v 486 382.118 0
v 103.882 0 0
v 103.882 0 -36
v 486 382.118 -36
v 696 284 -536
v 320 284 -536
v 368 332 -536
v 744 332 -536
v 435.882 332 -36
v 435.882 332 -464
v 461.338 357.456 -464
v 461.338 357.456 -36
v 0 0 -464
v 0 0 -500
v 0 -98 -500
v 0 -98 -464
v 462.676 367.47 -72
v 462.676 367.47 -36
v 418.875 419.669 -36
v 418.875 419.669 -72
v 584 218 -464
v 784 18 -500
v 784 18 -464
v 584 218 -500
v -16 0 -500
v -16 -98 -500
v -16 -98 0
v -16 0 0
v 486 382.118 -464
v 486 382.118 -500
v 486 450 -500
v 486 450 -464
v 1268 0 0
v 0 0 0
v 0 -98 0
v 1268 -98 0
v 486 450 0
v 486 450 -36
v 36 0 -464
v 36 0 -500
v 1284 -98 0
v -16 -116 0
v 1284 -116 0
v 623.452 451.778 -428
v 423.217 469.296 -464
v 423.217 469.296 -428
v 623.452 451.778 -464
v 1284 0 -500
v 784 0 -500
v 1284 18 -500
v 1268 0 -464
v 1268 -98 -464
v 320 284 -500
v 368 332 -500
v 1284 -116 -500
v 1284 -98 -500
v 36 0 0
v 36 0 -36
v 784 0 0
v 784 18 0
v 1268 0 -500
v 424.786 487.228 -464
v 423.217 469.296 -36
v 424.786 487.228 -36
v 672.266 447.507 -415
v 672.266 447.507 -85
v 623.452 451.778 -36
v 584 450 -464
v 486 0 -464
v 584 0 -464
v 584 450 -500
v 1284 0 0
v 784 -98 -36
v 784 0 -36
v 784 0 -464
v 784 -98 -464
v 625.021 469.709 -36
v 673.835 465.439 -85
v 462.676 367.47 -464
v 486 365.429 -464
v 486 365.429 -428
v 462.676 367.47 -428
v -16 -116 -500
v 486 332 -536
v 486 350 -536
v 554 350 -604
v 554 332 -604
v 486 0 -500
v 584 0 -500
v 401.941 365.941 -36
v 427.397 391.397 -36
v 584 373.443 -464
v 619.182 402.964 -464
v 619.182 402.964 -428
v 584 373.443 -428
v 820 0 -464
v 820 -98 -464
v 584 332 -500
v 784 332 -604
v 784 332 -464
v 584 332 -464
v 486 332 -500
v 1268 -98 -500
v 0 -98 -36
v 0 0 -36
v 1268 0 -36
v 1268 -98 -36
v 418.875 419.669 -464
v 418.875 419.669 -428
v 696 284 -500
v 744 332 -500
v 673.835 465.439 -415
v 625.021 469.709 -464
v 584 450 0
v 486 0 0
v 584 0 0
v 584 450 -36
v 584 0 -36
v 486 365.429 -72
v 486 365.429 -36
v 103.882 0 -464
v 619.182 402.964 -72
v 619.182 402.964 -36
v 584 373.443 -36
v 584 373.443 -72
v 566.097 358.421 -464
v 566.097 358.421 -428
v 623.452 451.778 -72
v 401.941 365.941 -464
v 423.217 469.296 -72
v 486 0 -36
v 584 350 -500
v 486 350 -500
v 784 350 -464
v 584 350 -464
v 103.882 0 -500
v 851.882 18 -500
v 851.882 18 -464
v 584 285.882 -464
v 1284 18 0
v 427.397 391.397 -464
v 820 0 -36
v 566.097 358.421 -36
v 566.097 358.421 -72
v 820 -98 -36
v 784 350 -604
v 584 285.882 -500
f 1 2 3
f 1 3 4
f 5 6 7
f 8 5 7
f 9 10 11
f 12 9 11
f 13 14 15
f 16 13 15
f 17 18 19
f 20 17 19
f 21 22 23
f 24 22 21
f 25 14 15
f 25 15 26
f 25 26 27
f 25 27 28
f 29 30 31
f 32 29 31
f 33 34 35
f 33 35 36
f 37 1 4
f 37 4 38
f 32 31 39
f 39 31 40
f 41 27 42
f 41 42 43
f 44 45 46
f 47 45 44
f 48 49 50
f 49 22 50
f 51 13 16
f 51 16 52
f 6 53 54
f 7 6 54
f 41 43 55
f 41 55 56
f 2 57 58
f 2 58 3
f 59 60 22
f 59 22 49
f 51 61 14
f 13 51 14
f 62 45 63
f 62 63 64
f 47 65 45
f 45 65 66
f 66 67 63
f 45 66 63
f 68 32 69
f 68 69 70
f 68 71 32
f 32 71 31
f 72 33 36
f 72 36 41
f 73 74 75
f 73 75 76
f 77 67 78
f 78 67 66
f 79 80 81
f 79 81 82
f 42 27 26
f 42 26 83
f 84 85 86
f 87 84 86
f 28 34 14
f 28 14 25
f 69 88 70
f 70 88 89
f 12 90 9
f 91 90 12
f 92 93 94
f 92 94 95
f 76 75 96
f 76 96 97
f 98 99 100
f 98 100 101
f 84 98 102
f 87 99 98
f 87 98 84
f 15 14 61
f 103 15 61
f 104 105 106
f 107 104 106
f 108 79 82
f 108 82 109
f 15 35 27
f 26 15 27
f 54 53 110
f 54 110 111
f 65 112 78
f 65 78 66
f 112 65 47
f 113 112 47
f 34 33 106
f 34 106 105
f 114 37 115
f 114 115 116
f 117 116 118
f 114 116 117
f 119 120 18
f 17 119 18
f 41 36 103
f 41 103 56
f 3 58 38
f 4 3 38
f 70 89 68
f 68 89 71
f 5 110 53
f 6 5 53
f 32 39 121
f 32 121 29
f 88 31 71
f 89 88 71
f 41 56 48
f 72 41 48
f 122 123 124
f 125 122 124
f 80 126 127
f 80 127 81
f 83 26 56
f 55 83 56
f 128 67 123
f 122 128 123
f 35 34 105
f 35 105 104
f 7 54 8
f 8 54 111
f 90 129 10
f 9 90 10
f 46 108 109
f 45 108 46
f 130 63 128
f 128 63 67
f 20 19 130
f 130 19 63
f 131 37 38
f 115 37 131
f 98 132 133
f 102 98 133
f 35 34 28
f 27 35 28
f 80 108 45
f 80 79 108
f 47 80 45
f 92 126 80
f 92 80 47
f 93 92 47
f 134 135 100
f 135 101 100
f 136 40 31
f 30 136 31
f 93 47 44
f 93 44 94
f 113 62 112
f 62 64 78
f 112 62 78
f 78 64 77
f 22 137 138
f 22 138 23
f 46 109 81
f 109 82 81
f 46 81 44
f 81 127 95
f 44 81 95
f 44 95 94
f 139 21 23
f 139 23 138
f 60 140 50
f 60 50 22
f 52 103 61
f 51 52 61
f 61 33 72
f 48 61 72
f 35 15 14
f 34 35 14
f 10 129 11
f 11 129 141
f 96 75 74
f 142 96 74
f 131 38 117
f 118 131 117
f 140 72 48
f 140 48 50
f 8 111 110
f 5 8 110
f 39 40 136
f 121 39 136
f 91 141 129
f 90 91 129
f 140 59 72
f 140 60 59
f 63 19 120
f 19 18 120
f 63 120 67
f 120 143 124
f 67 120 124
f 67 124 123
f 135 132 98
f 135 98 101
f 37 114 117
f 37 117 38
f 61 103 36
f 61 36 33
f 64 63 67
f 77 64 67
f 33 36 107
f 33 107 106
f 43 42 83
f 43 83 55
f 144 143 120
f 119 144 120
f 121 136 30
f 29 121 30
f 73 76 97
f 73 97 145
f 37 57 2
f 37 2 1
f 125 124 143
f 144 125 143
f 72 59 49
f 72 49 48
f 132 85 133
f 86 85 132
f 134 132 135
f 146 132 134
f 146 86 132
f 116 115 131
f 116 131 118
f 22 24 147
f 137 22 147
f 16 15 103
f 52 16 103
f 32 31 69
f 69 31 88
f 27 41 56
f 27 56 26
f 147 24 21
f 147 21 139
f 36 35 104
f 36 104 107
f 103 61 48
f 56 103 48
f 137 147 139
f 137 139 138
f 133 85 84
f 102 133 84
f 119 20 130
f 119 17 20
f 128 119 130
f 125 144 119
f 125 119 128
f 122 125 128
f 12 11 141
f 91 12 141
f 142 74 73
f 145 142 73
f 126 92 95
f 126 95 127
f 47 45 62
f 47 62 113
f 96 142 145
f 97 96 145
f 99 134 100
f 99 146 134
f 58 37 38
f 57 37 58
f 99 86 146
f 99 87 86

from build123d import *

# Parameters (mm, degrees)
F1_DEPTH       = 500
F2_DEPTH       = 36
F3_DEPTH       = 36
F4_DEPTH       = 36
F5_DEPTH       = 500
F0_W           = 16
F0_H           = 98
F6_DEPTH       = 500
F8_DEPTH       = 36
F9_DEPTH       = 428
F14_W          = 98
F14_H          = 428
F15_DEPTH      = 36
F16_W          = 98
F16_H          = 48
F17_DEPTH      = 36
F16_H_2        = 18
F18_DEPTH      = 104
F18_DEPTH_BACK = 36
F19_W          = 98
F19_H          = 36
F20_DEPTH      = 18
F22_DEPTH      = 36
F24_DEPTH      = 428
F26_DEPTH      = 18


with BuildPart() as f1:
    # F0 (on Top) → F1 (new body)
    with BuildSketch(Plane.XY):
        Polygon((1268, -98), (0, -98), (-16, -98), (-16, -116), (1284, -116), (1284, -98), align=None)
    extrude(amount=-F1_DEPTH)


with BuildPart() as f2:
    # F0 (on Top) → F2 (new body)
    with BuildSketch(Plane.XY):
        Polygon((36, 0), (0, 0), (0, -98), (1268, -98), (1268, 0), (784, 0), (584, 0), (486, 0), (103.8822509939, 0), align=None)
    extrude(amount=-F2_DEPTH)


with BuildPart() as f3:
    # F0 (on Top) → F3 (new body)
    with BuildSketch(Plane.XY):
        Polygon((584, 450), (486, 450), (486, 382.1177490061), (486, 0), (584, 0), align=None)
    extrude(amount=-F3_DEPTH)


with BuildPart() as f4:
    # F0 (on Top) → F4 (new body)
    with BuildSketch(Plane.XY):
        Polygon((486, 450), (36, 0), (103.8822509939, 0), (486, 382.1177490061), align=None)
    extrude(amount=-F4_DEPTH)


with BuildPart() as f5:
    # F0 (on Top) → F5 (new body)
    with BuildSketch(Plane.XY):
        Polygon((784, 0), (1268, 0), (1284, 0), (1284, 18), (784, 18), align=None)
    extrude(amount=-F5_DEPTH)


with BuildPart() as f6:
    # F0 (on Top) → F6 (new body)
    with BuildSketch(Plane.XY):
        with Locations((1276, -49)):
            Rectangle(F0_W, F0_H)
    extrude(amount=-F6_DEPTH)


with BuildPart() as f8:
    # F7 (on face) → F8 (new body)
    with BuildSketch(Plane(origin=(0, 0, -36), x_dir=(1, 0, 0), z_dir=(0, 0, -1))):
        Polygon((418.8753596794, -419.6689985812), (423.2171666194, -469.2960789942), (623.4523009358, -451.7777747019), (619.1816695412, -402.9642344955), (584, -373.4433085592), (584, -450), (486, -450), (486, -365.4289487301), (462.6759038301, -367.469542732), align=None)
        Polygon((566.0974979401, -358.4213256836), (486, -365.4289487301), (486, -450), (584, -450), (584, -373.4433085592), align=None)
    extrude(amount=F8_DEPTH)


with BuildPart() as f9:
    # F7 (on face) → F9 (new body)
    with BuildSketch(Plane(origin=(0, 0, -36), x_dir=(1, 0, 0), z_dir=(0, 0, -1))):
        Polygon((423.2171666194, -469.2960789942), (424.7859699888, -487.2275835599), (673.8346445118, -465.438647873), (672.2658411423, -447.5071433073), (623.4523009358, -451.7777747019), align=None)
    extrude(amount=F9_DEPTH)

    # F25 (on face) → F26 (cut, through all)
    with BuildSketch(Plane(origin=(43.9610143142, 502.4766928934, 0), x_dir=(0.9961946981, -0.0871557427, 0), z_dir=(-0.0871557427, -0.9961946981, 0))):
        Polygon((630.7048491943, -36), (581.7048491943, -36), (630.7048491943, -85), align=None)
        Polygon((630.7048491943, -464), (630.7048491943, -415), (581.7048491943, -464), align=None)
    extrude(amount=-F26_DEPTH, mode=Mode.SUBTRACT)


with BuildPart() as f11_1:
    # F11: instance of F3
    add(f3.part.mirror(Plane(origin=(317, -53.5, -250), x_dir=(1, 0, 0), z_dir=(0, 0, 1))))


with BuildPart() as f11_2:
    # F11: instance of F2
    add(f2.part.mirror(Plane(origin=(317, -53.5, -250), x_dir=(1, 0, 0), z_dir=(0, 0, 1))))


with BuildPart() as f11_3:
    # F11: instance of F4
    add(f4.part.mirror(Plane(origin=(317, -53.5, -250), x_dir=(1, 0, 0), z_dir=(0, 0, 1))))


with BuildPart() as f11_4:
    # F11: instance of F8
    add(f8.part.mirror(Plane(origin=(317, -53.5, -250), x_dir=(1, 0, 0), z_dir=(0, 0, 1))))


with BuildPart() as f13_1:
    # F13: instance of F6
    add(f6.part.mirror(Plane(origin=(634, -107, -250), x_dir=(0, -1, 0), z_dir=(-1, 0, 0))))


with BuildPart() as f15:
    # F14 (on face) → F15 (new body)
    with BuildSketch(Plane(origin=(784, 0, 0), x_dir=(0, -1, 0), z_dir=(-1, 0, 0))):
        with Locations((49, -250)):
            Rectangle(F14_W, F14_H)
    extrude(amount=-F15_DEPTH)


with BuildPart() as f17:
    # F16 (on face) → F17 (new body)
    with BuildSketch(Plane(origin=(0, 0, -500), x_dir=(1, 0, 0), z_dir=(0, 0, -1))):
        with Locations((535, -308)):
            Rectangle(F16_W, F16_H)
        Polygon((368, -332), (486, -332), (486, -284), (320, -284), align=None)
        Polygon((584, -284), (584, -332), (744, -332), (696, -284), align=None)
    extrude(amount=F17_DEPTH)


with BuildPart() as f18:
    # F16 (on face) → F18 (new body, two sides)
    with BuildSketch(Plane(origin=(0, 0, -500), x_dir=(1, 0, 0), z_dir=(0, 0, -1))) as f18_sk:
        Polygon((584, -332), (584, -350), (784, -350), (784, -332), (744, -332), align=None)
        with Locations((535, -341)):
            Rectangle(F16_W, F16_H_2)
    extrude(amount=F18_DEPTH)
    extrude(f18_sk.sketch, amount=-F18_DEPTH_BACK)

    # F19 (on face) → F20 (cut, through all)
    with BuildSketch(Plane(origin=(0, 350, 0), x_dir=(-1, 0, 0), z_dir=(0, 1, 0))):
        with Locations((-535, -482)):
            Rectangle(F19_W, F19_H)
        Polygon((-486, -604), (-486, -536), (-554, -604), align=None)
    extrude(amount=-F20_DEPTH, mode=Mode.SUBTRACT)


with BuildPart() as f22:
    # F21 (on face) → F22 (new body)
    with BuildSketch(Plane(origin=(0, 0, -500), x_dir=(1, 0, 0), z_dir=(0, 0, -1))):
        Polygon((851.8822509939, -18), (784, -18), (584, -218), (584, -285.8822509939), align=None)
    extrude(amount=-F22_DEPTH)


with BuildPart() as f24:
    # F23 (on face) → F24 (new body, through all)
    with BuildSketch(Plane.XY.offset(-464)):
        Polygon((461.3380951166, 357.4558441227), (427.3969696197, 391.3969696197), (401.941125497, 365.941125497), (435.8822509939, 332), align=None)
    extrude(amount=F24_DEPTH)


solid = Compound([f1.part, f2.part, f3.part, f4.part, f5.part, f6.part, f8.part, f9.part, f11_1.part, f11_2.part, f11_3.part, f11_4.part, f13_1.part, f15.part, f17.part, f18.part, f22.part, f24.part])
